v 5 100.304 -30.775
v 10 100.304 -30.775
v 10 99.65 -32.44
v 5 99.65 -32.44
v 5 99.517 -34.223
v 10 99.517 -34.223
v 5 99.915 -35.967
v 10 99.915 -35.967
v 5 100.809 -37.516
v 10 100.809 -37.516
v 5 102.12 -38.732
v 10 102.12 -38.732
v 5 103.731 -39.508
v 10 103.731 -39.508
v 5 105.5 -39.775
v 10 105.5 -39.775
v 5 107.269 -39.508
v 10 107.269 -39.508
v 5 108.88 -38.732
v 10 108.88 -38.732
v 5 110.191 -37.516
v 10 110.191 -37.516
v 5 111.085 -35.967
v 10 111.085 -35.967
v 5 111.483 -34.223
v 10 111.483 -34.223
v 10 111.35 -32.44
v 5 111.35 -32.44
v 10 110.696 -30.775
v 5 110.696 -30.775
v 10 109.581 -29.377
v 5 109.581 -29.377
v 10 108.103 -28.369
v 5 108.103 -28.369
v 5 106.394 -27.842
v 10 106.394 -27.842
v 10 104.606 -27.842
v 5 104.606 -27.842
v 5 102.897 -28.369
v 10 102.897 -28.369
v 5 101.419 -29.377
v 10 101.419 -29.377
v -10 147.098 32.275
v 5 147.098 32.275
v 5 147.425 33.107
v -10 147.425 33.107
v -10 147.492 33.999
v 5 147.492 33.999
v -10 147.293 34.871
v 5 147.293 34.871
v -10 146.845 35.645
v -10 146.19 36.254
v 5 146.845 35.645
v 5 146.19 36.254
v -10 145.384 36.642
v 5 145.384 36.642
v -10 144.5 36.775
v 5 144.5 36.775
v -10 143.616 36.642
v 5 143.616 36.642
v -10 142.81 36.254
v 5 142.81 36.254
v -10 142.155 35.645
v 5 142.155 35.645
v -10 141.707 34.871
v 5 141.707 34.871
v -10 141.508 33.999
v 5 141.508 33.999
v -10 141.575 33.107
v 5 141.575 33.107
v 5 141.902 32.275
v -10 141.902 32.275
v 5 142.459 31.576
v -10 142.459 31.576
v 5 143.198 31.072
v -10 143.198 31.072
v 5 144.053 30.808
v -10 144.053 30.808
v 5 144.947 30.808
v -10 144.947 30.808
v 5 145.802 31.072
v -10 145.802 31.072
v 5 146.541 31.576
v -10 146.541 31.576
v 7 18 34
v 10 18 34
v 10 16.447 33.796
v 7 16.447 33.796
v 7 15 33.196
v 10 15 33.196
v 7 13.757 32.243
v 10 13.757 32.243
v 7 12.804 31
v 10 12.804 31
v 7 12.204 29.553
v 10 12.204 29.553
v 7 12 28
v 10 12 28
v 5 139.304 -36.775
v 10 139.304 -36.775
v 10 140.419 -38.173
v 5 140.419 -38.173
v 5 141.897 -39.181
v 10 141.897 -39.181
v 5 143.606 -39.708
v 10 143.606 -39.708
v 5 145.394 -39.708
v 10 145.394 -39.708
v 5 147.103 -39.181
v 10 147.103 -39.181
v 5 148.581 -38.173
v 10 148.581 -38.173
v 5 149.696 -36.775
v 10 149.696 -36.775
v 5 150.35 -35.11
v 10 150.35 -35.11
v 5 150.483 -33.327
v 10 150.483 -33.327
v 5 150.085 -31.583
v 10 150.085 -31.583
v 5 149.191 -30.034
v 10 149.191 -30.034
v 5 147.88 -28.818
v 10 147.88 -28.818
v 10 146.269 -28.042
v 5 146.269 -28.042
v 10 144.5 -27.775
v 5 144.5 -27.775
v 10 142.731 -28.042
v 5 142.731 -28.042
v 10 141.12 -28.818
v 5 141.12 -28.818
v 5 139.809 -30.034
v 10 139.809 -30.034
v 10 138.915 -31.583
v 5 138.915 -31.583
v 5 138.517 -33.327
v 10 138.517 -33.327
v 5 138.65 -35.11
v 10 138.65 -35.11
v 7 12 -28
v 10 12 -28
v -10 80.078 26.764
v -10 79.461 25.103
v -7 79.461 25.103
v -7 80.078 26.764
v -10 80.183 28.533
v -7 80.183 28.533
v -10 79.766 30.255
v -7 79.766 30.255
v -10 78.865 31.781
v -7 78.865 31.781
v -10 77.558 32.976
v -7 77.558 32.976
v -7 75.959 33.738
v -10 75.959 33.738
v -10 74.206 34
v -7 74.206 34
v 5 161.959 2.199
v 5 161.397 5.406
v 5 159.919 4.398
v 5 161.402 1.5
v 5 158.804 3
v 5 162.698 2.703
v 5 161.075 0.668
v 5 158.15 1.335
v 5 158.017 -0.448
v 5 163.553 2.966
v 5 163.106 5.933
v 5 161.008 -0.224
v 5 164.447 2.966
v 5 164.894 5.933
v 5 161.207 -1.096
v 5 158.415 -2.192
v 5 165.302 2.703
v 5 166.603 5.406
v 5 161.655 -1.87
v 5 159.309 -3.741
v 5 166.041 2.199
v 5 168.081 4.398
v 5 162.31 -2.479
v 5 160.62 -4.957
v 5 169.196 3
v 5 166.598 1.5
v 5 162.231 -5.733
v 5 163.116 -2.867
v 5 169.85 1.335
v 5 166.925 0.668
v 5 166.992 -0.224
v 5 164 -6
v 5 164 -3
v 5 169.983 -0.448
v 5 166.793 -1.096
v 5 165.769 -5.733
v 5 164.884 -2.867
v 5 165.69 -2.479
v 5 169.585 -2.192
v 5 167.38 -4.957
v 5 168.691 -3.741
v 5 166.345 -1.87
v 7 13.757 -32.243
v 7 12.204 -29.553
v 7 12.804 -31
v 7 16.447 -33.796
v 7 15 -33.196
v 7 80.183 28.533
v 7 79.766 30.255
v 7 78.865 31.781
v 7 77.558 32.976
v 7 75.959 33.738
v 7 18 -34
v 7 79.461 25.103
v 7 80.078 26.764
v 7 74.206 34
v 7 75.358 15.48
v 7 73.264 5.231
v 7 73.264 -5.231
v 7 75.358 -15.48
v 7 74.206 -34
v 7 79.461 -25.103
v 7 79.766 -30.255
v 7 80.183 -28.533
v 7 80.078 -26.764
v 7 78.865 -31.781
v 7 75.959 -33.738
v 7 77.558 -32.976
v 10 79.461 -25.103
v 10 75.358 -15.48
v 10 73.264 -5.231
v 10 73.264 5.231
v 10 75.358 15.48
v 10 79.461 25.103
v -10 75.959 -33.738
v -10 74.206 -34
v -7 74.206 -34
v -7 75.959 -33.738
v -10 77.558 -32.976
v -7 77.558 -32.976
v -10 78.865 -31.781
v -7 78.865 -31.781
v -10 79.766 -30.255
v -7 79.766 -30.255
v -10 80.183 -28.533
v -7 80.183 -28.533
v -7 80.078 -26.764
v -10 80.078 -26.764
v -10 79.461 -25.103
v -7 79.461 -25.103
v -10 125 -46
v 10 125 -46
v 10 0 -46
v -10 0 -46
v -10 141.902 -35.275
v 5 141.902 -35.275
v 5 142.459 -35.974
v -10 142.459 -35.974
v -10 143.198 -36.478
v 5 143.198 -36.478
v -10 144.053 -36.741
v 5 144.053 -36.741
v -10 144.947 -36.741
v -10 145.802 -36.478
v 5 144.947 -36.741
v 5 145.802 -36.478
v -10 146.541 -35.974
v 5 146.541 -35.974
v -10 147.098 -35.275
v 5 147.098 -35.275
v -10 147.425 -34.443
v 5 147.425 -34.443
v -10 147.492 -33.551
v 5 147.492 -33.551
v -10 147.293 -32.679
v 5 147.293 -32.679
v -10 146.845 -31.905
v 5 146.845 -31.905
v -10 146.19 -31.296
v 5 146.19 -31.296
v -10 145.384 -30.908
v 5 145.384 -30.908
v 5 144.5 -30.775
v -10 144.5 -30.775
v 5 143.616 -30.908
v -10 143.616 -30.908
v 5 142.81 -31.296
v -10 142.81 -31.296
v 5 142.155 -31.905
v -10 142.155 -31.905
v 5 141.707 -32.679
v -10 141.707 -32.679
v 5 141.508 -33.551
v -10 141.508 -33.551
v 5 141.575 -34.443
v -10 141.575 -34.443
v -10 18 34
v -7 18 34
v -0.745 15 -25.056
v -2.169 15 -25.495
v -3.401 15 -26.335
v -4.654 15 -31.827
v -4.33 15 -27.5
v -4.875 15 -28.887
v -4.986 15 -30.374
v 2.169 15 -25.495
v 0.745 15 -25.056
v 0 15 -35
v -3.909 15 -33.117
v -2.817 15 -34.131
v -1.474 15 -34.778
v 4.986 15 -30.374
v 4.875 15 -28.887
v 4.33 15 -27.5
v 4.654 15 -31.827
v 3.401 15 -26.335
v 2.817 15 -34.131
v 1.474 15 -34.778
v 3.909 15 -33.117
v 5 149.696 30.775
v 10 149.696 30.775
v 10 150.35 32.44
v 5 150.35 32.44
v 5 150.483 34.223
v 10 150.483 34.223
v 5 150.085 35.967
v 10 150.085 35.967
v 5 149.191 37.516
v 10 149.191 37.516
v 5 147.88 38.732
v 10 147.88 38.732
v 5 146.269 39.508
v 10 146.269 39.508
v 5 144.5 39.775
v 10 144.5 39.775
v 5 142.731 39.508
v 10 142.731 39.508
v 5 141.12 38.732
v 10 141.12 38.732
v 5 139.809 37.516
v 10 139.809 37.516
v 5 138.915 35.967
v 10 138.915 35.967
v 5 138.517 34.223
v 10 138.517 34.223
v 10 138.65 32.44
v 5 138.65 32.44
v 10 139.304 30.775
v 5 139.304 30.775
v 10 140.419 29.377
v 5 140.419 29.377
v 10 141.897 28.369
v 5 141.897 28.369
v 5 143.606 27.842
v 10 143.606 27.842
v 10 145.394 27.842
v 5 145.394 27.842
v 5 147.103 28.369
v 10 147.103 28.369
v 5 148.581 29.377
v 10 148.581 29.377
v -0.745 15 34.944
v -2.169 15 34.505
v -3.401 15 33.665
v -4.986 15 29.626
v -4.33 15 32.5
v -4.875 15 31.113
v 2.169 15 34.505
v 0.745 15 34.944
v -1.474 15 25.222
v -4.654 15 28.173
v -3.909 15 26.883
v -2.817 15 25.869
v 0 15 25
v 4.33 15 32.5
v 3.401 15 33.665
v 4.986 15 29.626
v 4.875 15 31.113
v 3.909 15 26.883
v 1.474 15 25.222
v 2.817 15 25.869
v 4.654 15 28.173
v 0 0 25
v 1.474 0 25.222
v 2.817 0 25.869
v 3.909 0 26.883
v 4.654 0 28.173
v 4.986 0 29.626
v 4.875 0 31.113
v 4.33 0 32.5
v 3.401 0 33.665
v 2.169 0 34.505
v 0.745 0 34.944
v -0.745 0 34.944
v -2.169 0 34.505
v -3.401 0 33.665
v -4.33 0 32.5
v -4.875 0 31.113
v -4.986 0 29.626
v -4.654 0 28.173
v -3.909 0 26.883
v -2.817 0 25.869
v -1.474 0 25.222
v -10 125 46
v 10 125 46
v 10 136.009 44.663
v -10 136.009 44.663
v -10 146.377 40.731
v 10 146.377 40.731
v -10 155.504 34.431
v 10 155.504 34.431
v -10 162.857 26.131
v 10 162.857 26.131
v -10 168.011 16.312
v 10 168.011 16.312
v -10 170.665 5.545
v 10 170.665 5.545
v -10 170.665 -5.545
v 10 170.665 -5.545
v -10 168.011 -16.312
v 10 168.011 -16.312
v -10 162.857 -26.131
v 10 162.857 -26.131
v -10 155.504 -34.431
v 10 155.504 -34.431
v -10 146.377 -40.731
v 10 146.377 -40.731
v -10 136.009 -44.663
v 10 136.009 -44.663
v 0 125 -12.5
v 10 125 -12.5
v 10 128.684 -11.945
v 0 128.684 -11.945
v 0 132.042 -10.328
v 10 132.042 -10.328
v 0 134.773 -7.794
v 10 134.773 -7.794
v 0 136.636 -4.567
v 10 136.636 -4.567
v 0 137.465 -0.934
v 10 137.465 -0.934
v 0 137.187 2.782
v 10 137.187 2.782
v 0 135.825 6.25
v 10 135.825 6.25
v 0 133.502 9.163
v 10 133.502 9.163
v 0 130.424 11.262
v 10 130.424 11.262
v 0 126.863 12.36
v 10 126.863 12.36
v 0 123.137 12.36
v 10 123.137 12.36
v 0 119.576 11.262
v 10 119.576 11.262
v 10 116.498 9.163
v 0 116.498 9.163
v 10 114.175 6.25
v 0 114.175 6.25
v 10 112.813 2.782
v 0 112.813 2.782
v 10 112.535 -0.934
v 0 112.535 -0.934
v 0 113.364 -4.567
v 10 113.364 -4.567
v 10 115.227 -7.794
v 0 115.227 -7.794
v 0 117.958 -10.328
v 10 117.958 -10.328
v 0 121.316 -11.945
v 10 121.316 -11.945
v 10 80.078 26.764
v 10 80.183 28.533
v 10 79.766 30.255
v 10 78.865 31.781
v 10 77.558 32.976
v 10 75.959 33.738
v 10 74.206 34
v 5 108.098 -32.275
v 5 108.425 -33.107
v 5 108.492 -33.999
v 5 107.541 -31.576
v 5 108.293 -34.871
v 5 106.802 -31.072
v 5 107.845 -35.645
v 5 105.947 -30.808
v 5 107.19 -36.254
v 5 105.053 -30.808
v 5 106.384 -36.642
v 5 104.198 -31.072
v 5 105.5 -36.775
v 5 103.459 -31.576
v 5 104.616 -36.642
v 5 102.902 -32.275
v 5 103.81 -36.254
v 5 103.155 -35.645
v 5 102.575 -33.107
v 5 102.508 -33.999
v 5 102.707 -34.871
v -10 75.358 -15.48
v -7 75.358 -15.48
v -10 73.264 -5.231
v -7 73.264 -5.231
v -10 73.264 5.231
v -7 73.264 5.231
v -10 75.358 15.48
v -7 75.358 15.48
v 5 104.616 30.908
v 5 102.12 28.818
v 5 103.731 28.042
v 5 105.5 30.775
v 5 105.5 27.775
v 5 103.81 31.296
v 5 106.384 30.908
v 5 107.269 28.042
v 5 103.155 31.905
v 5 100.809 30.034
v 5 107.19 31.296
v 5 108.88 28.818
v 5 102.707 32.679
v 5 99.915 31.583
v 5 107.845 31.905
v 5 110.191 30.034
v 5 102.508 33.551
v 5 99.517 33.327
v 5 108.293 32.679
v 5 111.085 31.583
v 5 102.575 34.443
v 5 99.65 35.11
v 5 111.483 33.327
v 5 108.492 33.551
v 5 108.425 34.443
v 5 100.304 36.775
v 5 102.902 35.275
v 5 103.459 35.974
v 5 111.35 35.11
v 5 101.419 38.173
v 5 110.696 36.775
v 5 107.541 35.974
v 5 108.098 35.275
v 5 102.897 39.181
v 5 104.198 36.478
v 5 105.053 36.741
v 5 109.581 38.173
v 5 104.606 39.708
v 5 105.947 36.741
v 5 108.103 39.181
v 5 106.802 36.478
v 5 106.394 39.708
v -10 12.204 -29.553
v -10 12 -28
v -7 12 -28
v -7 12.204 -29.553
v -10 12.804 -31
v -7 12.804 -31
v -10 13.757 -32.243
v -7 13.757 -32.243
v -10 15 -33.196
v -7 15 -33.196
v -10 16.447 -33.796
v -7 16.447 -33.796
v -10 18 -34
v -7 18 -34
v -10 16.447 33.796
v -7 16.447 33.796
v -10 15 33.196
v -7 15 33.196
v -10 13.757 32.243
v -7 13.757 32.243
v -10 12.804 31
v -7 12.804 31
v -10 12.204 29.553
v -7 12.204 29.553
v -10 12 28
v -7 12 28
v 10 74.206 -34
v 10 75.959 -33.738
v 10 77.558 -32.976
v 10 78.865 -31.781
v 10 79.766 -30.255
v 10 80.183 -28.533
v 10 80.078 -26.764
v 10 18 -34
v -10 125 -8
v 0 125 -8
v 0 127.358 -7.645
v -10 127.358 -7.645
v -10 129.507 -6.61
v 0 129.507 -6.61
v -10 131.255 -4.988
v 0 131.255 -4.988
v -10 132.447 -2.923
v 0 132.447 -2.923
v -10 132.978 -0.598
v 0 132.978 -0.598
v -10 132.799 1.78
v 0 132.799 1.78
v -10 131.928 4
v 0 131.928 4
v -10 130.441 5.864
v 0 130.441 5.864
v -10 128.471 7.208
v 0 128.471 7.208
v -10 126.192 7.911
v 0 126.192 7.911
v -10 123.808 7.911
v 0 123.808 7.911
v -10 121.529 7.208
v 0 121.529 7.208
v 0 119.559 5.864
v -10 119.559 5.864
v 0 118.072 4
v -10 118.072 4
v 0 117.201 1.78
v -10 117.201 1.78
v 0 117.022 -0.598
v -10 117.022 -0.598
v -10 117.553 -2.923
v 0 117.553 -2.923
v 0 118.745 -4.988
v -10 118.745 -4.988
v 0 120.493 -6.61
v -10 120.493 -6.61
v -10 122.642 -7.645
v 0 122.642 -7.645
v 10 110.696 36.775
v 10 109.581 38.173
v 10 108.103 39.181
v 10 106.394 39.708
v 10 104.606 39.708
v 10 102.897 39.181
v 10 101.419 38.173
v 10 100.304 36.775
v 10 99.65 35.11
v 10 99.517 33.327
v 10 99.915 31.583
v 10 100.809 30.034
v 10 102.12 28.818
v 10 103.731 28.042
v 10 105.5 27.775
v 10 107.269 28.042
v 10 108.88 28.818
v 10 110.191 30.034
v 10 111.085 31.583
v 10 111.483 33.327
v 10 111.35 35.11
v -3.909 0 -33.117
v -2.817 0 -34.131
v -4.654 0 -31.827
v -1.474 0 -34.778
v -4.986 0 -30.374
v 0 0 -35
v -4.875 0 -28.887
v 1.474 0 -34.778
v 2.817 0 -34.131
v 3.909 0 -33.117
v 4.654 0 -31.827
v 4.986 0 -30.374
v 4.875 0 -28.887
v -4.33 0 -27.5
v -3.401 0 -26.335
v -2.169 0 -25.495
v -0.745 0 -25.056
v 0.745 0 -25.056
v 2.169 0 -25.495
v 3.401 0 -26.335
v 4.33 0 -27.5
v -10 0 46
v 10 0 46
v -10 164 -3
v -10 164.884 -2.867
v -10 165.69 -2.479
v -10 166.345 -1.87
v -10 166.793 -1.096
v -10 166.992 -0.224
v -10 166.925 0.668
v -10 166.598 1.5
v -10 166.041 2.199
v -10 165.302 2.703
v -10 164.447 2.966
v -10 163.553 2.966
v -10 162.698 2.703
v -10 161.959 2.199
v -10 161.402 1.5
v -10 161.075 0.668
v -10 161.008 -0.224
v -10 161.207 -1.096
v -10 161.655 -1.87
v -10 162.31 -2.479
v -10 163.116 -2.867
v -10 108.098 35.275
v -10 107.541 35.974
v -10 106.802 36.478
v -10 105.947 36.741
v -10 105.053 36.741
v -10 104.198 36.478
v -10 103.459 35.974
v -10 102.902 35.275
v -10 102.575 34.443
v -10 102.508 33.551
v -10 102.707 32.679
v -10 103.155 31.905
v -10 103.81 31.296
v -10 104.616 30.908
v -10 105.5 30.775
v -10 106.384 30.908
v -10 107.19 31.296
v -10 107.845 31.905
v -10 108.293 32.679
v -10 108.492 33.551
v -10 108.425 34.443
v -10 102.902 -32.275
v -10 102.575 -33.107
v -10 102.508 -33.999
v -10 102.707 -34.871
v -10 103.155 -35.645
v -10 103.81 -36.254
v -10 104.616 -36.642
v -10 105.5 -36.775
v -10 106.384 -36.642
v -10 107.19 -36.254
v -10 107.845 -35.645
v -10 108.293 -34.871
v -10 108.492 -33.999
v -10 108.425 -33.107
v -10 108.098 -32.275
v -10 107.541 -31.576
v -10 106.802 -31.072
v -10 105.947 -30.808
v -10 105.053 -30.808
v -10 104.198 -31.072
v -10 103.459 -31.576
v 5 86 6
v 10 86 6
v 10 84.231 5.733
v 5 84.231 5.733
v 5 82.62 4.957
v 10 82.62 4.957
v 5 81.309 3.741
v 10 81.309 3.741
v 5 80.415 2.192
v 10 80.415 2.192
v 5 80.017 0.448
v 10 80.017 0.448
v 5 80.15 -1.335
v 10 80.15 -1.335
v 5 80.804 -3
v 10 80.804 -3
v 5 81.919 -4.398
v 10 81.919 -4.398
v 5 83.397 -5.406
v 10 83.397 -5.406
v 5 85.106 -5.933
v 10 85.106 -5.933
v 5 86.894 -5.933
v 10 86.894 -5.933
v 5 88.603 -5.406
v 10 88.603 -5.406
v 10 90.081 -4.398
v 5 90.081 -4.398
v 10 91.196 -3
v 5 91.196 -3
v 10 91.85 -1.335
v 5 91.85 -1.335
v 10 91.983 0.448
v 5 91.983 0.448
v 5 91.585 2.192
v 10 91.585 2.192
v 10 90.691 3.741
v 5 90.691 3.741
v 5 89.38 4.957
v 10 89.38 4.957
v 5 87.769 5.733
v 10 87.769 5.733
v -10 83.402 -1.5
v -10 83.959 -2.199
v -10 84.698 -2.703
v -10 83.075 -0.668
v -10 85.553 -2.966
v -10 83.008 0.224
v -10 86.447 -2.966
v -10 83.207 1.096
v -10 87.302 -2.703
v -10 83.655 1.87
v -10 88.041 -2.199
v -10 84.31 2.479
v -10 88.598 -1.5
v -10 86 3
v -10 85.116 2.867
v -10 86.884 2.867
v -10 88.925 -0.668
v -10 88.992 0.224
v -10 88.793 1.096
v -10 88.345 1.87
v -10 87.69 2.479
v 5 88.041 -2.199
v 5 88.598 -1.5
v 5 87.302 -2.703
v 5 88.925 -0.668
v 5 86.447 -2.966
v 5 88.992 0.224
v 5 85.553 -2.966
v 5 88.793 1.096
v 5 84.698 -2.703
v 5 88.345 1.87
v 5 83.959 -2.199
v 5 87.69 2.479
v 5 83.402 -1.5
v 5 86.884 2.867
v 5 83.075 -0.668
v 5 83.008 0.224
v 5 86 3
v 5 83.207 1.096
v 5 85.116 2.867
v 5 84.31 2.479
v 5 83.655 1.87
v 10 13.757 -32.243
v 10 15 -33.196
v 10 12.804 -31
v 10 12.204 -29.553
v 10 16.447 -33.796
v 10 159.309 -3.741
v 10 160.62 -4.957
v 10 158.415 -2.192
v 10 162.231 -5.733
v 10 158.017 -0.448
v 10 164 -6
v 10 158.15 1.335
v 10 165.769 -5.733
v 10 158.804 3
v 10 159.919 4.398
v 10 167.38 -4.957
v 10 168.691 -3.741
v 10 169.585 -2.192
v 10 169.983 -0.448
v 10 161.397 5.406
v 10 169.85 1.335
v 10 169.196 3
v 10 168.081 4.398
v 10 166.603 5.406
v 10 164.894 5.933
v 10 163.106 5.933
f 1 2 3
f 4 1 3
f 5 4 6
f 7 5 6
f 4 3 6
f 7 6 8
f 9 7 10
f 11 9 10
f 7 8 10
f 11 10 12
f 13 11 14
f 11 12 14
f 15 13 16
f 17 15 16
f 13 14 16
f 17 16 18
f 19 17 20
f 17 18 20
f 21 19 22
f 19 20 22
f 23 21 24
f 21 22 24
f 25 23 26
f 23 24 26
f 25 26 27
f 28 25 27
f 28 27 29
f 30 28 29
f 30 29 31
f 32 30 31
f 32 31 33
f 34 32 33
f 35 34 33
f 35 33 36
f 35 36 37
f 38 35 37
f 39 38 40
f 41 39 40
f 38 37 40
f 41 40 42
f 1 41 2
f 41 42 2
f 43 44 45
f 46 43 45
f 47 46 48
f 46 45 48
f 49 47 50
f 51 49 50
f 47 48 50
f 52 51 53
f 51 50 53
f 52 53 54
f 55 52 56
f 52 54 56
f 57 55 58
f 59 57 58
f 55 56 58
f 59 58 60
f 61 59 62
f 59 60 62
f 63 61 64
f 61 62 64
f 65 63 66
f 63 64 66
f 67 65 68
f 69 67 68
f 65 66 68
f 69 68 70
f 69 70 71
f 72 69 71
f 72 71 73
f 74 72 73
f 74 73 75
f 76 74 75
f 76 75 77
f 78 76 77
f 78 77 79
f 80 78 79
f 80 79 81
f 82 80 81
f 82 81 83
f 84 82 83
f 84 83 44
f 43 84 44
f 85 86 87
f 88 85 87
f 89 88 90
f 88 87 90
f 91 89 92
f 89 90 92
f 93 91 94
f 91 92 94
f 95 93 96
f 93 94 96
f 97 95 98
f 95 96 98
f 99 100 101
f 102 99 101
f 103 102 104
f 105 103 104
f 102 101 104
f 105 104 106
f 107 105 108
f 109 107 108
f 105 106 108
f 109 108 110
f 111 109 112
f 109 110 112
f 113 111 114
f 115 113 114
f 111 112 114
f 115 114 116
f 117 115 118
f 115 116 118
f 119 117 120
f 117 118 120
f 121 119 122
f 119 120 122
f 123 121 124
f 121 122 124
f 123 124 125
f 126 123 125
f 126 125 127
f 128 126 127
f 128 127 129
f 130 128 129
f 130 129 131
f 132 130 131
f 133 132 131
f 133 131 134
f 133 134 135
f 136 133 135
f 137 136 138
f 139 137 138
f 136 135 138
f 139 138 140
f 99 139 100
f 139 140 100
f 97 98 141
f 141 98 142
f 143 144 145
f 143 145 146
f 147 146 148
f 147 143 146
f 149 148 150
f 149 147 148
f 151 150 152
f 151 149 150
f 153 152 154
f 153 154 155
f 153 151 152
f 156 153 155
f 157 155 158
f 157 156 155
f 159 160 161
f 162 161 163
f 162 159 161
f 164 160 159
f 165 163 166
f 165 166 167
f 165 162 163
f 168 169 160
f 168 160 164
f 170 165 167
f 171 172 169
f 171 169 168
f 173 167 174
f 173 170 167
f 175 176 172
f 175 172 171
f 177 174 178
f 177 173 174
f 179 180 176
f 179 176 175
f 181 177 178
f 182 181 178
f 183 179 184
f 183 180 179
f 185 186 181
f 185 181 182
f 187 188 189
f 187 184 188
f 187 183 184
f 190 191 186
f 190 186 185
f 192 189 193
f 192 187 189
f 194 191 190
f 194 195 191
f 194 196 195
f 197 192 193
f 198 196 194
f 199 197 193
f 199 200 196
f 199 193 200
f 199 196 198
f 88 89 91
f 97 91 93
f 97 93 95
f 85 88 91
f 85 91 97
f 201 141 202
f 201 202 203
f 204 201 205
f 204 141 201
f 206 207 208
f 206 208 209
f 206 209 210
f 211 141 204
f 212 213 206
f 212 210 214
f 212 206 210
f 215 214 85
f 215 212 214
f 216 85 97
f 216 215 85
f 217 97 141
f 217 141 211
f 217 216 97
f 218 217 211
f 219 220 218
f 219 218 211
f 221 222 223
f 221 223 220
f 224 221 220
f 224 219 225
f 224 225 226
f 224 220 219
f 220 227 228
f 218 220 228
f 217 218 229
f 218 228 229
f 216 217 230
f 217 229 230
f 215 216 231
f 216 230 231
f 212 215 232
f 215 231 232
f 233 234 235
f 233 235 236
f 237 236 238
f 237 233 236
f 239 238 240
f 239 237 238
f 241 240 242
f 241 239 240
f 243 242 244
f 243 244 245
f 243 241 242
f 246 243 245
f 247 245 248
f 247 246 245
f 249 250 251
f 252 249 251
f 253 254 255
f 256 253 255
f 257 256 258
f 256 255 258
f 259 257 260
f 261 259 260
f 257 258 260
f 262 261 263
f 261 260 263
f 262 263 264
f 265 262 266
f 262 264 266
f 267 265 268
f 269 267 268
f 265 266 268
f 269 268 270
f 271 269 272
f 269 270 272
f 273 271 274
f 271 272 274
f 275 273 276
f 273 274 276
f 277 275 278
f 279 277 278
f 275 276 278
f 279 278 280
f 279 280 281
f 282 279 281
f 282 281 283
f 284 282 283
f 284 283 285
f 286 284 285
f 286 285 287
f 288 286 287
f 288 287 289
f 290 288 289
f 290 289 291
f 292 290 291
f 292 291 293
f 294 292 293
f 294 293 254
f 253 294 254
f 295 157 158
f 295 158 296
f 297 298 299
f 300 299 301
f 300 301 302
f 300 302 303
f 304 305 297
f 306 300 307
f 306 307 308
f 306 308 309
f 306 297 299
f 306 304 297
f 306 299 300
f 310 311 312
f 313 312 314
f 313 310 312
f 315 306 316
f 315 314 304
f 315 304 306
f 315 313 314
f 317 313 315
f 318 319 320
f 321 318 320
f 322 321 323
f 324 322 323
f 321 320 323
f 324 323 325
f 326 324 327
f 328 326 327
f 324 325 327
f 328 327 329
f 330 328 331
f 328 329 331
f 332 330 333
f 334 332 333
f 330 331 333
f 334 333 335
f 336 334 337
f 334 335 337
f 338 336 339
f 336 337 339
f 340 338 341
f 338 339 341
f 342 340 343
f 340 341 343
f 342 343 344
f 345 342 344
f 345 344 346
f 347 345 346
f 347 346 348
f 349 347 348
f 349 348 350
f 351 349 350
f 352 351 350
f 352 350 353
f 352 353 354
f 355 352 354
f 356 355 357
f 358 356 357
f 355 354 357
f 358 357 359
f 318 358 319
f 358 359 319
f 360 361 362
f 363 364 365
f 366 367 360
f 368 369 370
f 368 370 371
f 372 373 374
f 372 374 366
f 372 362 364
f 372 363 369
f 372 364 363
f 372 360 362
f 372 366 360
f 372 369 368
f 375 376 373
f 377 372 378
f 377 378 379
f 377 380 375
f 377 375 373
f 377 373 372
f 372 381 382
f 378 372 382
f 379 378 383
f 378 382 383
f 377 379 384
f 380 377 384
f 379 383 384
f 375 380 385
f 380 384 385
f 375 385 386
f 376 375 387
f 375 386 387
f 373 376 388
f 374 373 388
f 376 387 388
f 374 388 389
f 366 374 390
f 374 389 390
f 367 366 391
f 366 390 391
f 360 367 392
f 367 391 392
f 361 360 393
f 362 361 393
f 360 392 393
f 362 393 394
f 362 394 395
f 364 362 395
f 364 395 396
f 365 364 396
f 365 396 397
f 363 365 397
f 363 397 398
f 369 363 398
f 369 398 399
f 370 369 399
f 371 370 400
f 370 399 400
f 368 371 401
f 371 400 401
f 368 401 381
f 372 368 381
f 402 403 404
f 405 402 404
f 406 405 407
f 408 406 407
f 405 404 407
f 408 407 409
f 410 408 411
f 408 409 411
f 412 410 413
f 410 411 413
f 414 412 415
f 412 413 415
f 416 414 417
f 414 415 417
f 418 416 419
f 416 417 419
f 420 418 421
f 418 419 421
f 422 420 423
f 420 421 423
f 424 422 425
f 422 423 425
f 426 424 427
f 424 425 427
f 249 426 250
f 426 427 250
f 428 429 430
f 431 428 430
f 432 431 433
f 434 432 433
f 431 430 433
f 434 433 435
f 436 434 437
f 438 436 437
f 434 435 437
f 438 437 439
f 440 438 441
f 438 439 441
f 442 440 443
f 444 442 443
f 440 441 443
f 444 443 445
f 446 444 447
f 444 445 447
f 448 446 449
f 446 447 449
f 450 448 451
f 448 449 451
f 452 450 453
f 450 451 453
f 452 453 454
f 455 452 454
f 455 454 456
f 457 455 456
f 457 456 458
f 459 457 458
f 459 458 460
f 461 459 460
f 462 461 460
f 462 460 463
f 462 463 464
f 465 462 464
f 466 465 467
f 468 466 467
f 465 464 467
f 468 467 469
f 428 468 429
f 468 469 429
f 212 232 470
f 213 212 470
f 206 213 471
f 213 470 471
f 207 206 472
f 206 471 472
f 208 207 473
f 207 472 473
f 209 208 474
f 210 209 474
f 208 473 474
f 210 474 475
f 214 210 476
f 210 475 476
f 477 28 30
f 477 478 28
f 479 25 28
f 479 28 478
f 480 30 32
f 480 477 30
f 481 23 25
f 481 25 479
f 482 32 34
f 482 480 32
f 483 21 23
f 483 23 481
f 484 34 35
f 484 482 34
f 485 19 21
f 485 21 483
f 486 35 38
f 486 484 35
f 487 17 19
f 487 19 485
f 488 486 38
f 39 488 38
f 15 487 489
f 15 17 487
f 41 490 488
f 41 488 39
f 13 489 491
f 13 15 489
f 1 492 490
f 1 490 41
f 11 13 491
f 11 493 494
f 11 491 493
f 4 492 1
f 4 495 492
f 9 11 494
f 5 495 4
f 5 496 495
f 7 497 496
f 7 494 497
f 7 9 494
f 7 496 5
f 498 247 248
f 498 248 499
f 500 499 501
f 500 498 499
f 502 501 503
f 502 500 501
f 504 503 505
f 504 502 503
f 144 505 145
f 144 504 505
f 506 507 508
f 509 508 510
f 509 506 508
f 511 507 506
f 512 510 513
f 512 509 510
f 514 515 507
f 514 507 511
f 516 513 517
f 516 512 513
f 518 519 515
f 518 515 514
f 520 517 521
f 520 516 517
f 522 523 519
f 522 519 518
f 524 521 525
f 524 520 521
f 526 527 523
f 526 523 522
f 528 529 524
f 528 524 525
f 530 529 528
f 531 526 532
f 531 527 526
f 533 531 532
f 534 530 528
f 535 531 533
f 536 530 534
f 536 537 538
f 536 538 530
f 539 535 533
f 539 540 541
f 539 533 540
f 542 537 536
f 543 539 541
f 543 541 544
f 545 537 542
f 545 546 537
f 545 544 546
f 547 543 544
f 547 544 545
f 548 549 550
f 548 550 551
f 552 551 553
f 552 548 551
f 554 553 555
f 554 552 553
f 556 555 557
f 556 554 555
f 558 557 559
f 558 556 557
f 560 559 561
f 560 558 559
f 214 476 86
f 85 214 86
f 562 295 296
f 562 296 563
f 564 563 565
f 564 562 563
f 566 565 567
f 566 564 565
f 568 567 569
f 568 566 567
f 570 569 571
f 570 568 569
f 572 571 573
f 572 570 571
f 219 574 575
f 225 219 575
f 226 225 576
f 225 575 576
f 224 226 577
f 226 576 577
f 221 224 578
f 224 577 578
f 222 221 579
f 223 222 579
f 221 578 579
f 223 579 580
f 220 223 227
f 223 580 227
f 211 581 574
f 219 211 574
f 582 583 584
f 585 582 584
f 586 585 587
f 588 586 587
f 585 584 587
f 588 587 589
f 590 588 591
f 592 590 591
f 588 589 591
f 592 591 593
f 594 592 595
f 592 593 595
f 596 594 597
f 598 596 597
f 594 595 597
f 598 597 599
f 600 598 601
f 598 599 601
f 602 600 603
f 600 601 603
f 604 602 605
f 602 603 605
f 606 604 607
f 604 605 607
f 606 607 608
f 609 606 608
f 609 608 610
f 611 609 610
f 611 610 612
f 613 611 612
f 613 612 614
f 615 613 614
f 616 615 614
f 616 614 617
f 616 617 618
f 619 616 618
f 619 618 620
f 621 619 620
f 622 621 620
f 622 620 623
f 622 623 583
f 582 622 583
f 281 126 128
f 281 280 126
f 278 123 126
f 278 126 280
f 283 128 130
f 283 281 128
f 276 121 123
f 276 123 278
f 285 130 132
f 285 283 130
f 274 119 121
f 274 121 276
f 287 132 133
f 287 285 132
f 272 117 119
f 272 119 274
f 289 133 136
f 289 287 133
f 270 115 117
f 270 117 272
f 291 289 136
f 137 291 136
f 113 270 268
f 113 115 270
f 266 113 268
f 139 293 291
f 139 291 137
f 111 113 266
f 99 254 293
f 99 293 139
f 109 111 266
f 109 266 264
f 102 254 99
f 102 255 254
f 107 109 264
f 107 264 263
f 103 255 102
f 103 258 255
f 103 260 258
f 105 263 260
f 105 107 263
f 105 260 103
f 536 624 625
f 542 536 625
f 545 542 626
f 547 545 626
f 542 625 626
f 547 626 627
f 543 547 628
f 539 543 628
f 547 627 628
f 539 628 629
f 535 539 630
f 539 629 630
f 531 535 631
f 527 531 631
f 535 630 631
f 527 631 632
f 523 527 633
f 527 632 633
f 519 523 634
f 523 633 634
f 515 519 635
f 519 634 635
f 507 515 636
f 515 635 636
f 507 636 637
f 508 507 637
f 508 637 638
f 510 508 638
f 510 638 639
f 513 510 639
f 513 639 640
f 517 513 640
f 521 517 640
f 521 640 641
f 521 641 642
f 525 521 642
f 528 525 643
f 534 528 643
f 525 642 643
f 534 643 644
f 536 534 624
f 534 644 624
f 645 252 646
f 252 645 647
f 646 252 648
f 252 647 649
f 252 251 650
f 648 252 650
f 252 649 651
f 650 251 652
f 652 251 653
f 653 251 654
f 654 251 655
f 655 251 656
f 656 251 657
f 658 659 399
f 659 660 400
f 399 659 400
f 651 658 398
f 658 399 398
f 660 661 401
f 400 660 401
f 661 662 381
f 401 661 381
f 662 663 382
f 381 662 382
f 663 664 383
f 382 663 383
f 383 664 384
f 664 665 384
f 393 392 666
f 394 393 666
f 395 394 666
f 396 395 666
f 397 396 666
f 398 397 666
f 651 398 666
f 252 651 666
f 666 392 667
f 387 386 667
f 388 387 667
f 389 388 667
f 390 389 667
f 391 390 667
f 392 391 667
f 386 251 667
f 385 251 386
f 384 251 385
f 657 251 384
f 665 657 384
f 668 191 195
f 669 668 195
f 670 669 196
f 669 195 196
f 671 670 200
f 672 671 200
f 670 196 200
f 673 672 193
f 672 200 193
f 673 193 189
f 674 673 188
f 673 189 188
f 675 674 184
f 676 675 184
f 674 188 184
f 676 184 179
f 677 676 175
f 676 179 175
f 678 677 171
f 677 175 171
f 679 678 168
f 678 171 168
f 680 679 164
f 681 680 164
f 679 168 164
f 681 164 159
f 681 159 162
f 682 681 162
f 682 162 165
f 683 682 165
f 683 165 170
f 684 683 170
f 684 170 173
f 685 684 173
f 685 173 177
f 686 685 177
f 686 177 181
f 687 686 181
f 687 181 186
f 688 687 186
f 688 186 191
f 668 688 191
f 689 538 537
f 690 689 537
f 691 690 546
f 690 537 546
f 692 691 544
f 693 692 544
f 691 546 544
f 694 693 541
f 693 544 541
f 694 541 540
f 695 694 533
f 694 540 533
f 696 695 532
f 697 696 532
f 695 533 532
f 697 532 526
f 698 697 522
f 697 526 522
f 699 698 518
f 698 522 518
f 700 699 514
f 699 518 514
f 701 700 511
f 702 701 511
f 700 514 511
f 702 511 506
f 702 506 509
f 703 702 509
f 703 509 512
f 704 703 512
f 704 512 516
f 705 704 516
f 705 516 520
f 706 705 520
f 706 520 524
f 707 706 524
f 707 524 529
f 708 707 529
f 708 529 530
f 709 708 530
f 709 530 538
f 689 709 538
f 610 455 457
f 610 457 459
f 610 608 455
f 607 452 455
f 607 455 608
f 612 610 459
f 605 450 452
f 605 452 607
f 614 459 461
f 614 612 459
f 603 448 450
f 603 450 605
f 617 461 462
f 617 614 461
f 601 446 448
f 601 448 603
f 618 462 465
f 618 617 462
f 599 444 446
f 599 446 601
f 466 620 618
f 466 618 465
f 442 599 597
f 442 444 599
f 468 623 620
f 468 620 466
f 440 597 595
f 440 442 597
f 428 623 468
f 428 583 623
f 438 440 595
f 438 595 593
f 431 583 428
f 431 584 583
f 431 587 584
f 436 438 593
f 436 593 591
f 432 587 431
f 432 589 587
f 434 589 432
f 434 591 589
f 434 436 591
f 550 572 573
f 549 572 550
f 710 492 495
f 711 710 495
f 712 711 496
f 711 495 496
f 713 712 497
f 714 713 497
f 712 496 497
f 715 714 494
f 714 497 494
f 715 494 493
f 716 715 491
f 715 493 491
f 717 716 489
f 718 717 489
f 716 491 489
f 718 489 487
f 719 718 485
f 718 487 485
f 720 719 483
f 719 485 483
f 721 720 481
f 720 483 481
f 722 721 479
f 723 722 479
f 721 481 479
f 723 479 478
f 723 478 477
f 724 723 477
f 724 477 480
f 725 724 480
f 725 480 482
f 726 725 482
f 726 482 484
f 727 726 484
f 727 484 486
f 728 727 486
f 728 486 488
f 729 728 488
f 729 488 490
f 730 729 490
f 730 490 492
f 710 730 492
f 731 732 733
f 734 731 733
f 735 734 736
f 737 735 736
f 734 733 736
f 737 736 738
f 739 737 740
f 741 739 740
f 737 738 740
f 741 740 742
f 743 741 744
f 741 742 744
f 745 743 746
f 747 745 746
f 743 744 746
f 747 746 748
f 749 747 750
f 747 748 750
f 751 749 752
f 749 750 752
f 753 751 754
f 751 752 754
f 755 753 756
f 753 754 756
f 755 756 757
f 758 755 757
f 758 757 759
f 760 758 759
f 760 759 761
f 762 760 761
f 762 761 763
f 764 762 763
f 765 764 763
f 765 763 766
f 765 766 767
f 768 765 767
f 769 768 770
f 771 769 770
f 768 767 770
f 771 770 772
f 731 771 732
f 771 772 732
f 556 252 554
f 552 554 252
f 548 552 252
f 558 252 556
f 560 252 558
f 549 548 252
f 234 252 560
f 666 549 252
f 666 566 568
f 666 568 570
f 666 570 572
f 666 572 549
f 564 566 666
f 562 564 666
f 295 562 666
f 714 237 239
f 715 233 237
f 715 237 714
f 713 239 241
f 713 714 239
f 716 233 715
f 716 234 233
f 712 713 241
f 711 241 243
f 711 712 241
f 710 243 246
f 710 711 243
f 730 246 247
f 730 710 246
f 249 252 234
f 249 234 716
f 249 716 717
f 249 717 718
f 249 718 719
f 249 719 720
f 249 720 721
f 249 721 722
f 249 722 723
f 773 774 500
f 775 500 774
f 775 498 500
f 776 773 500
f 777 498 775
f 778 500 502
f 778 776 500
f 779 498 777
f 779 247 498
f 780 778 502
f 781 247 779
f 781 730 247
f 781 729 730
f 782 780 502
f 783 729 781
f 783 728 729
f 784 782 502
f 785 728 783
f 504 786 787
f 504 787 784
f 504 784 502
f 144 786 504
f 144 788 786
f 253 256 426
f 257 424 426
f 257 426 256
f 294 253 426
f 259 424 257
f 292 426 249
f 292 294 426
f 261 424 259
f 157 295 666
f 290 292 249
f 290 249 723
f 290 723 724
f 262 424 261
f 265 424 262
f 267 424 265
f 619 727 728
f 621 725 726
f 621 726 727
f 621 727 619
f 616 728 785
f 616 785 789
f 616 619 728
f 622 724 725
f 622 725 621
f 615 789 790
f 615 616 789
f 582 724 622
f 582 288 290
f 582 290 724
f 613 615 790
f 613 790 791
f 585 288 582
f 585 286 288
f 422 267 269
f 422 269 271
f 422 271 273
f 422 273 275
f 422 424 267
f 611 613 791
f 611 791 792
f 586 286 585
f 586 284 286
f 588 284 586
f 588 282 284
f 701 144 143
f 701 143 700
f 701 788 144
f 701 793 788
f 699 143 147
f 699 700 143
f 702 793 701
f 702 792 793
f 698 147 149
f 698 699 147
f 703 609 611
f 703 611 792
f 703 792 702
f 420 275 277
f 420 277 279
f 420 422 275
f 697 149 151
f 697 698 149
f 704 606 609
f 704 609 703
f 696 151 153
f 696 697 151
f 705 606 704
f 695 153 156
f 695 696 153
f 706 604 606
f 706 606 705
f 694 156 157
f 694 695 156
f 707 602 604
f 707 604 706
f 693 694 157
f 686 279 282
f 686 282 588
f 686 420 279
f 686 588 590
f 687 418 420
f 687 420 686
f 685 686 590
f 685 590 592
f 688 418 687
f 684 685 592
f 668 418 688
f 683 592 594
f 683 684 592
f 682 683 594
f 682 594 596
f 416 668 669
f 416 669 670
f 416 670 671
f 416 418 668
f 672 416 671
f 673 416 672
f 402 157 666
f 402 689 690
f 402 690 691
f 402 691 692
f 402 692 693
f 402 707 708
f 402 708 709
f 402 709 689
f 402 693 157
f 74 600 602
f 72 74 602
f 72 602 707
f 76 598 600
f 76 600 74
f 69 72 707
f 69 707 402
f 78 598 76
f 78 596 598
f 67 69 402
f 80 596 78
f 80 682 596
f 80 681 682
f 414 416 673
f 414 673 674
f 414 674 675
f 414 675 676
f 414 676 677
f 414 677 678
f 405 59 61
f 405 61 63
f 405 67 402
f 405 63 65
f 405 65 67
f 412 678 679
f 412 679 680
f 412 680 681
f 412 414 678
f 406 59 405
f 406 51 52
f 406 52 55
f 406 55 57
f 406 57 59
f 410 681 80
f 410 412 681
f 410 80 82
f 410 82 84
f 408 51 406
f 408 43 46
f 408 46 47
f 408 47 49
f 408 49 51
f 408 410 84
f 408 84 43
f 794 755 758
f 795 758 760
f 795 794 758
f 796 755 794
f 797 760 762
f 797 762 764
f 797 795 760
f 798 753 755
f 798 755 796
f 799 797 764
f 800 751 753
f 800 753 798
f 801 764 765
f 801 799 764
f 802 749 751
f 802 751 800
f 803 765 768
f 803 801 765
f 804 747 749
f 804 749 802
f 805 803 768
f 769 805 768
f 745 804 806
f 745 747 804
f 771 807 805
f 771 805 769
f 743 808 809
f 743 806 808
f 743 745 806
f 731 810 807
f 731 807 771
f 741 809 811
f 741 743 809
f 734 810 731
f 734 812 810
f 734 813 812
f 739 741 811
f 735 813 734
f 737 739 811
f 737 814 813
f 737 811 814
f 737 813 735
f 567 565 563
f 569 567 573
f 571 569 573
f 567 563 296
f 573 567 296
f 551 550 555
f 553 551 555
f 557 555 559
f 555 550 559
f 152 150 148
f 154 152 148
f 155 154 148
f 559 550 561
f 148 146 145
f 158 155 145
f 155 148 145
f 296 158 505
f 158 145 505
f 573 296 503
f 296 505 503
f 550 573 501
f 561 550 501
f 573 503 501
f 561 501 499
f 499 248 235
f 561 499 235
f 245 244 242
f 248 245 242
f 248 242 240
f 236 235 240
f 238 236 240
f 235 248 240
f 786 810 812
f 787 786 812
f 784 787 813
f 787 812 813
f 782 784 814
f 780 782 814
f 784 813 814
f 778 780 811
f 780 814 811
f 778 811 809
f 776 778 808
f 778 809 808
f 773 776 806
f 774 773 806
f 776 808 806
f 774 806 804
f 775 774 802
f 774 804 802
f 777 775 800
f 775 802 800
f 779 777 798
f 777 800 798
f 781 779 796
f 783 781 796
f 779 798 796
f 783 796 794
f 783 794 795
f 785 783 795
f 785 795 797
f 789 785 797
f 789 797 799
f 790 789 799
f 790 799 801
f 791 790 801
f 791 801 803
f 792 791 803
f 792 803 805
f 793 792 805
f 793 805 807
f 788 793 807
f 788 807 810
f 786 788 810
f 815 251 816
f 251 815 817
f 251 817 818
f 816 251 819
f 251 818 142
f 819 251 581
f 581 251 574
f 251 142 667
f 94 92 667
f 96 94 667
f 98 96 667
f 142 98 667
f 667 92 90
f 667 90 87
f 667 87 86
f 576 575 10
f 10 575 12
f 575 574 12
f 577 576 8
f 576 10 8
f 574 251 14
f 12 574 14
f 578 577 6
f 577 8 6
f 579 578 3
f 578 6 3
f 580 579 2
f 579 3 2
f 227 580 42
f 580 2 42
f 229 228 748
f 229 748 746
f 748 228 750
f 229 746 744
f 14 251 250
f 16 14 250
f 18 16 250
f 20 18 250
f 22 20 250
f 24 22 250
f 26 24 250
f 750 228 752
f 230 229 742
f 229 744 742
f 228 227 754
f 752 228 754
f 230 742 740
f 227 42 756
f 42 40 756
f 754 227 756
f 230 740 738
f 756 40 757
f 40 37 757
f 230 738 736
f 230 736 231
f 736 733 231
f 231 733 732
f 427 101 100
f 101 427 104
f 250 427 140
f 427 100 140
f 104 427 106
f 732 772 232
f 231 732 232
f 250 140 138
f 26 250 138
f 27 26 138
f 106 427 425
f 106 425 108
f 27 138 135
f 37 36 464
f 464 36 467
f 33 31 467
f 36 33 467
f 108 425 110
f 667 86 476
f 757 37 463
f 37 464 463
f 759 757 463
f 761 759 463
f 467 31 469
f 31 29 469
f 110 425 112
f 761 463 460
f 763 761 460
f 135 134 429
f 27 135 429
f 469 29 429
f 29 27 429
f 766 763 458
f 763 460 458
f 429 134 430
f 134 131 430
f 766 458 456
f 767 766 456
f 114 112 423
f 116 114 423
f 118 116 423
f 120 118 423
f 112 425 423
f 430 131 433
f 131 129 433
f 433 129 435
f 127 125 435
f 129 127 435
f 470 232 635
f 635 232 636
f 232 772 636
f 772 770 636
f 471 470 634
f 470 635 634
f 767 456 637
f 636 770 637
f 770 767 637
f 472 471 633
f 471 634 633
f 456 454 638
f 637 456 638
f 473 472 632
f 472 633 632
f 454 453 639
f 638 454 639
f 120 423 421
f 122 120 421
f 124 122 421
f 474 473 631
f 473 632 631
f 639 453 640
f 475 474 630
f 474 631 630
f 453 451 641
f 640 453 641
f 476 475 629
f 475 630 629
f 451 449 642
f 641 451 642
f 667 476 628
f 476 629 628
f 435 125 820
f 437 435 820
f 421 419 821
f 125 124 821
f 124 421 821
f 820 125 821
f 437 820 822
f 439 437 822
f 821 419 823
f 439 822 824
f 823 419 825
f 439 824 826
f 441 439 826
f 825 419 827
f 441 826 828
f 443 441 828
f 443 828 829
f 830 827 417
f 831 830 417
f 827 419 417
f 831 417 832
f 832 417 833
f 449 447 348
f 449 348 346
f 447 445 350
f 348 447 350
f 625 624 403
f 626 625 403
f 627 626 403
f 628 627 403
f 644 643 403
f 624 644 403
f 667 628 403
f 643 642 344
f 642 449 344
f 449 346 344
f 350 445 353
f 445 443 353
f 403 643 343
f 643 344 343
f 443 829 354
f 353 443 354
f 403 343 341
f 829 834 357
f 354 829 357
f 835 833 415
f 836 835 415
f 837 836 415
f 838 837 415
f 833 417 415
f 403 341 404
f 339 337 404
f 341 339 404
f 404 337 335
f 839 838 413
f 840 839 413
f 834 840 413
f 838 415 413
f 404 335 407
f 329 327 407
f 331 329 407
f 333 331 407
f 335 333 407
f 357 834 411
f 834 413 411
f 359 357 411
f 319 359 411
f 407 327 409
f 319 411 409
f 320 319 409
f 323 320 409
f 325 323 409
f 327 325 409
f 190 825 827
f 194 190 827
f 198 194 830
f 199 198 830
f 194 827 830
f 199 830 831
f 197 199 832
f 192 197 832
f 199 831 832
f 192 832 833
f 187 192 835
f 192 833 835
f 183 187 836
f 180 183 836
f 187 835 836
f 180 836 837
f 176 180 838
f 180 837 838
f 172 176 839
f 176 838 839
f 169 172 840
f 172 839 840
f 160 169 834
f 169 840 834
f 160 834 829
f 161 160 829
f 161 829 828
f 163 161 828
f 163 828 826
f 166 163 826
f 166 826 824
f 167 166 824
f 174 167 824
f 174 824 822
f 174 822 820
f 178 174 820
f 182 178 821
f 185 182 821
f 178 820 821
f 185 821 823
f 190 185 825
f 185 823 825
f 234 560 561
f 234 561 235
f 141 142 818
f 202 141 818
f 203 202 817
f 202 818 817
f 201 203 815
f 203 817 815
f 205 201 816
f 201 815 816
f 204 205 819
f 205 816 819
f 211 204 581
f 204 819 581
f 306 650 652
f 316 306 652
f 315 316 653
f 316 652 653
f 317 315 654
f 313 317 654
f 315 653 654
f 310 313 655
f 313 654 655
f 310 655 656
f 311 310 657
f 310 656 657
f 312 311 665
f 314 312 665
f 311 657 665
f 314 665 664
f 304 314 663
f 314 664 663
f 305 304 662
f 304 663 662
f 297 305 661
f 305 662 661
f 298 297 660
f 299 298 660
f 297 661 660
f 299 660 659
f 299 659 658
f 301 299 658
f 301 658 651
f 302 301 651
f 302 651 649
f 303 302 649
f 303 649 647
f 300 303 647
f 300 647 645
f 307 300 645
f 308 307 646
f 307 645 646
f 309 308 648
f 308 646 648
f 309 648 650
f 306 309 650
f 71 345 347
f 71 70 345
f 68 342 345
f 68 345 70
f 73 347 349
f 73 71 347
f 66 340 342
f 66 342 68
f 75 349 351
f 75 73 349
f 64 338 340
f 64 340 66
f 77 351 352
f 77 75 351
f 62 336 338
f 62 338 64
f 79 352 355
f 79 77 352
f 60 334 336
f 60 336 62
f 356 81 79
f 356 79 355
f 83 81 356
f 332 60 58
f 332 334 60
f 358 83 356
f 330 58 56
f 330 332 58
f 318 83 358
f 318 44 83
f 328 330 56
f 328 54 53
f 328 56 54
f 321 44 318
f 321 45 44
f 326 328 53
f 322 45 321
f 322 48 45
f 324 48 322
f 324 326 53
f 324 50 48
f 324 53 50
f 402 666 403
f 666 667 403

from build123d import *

# Parameters (mm, degrees)
BOSS_EXTRUDE1_DEPTH = 10
CUT_EXTRUDE1_DEPTH  = 3
SKETCH3_R           = 6
CUT_EXTRUDE2_DEPTH  = 5
SKETCH3_3_R         = 3
CUT_EXTRUDE3_DEPTH  = 179.204938203
CIRPATTERN1_COUNT   = 6
SKETCH4_R           = 12.5
CUT_EXTRUDE4_DEPTH  = 10
SKETCH4_3_R         = 8
CUT_EXTRUDE5_DEPTH  = 179.204938203
SKETCH5_R           = 5
CUT_EXTRUDE6_DEPTH  = 15


with BuildPart() as part:
    # Sketch1 → Boss-Extrude1 (new, symmetric)
    with BuildSketch(Plane(origin=(0, 0, 0), x_dir=(0, 0, -1), z_dir=(1, 0, 0))):
        with BuildLine():
            Line((46, 125), (46, 0))
            Line((46, 0), (-46, 0))
            Line((-46, 0), (-46, 125))
            ThreePointArc((-46, 125), (0, 171), (46, 125))
        make_face()
    extrude(amount=BOSS_EXTRUDE1_DEPTH, both=True)

    # Sketch2 → Cut-Extrude1 (cut)
    with BuildSketch(Plane(origin=(10, 0, 0), x_dir=(0, 0, -1), z_dir=(1, 0, 0))):
        with BuildLine():
            Line((-34, 74.206299603), (-34, 18))
            ThreePointArc((-34, 18), (-32.242640687, 13.757359313), (-28, 12))
            Line((-28, 12), (28, 12))
            ThreePointArc((28, 12), (32.242640687, 13.757359313), (34, 18))
            Line((34, 18), (34, 74.206299603))
            ThreePointArc((34, 74.206299603), (31.051285766, 79.372502771), (25.103448276, 79.460820334))
            ThreePointArc((25.103448276, 79.460820334), (0, 73), (-25.103448276, 79.460820334))
            ThreePointArc((-25.103448276, 79.460820334), (-31.051285766, 79.372502771), (-34, 74.206299603))
        make_face()
    cut_extrude1 = extrude(amount=-CUT_EXTRUDE1_DEPTH, mode=Mode.SUBTRACT)

    # Mirror1: Cut-Extrude1 across plane
    add(cut_extrude1.mirror(Plane(origin=(0, 0, 0), x_dir=(0, 0, 1), z_dir=(1, 0, 0))), mode=Mode.SUBTRACT)

    # Sketch3 → Cut-Extrude2 (cut)
    with BuildSketch(Plane(origin=(10, 0, 0), x_dir=(0, 0, -1), z_dir=(1, 0, 0))):
        with Locations((0, 164)):
            Circle(SKETCH3_R)
    cut_extrude2 = extrude(amount=-CUT_EXTRUDE2_DEPTH, mode=Mode.SUBTRACT)

    # Sketch3<3> → Cut-Extrude3 (cut, through all)
    with BuildSketch(Plane(origin=(10, 0, 0), x_dir=(0, 0, -1), z_dir=(1, 0, 0))):
        with Locations((0, 164)):
            Circle(SKETCH3_3_R)
    cut_extrude3 = extrude(amount=-CUT_EXTRUDE3_DEPTH, mode=Mode.SUBTRACT)

    # CirPattern1: Cut-Extrude2, Cut-Extrude3 ×6 about axis
    cirpattern1_axis = Axis((10, 125, 0), (1, 0, 0))
    add([cut_extrude2.rotate(cirpattern1_axis, i * 360 / CIRPATTERN1_COUNT) for i in range(1, CIRPATTERN1_COUNT)], mode=Mode.SUBTRACT)
    add([cut_extrude3.rotate(cirpattern1_axis, i * 360 / CIRPATTERN1_COUNT) for i in range(1, CIRPATTERN1_COUNT)], mode=Mode.SUBTRACT)

    # Sketch4 → Cut-Extrude4 (cut)
    with BuildSketch(Plane(origin=(10, 0, 0), x_dir=(0, 0, -1), z_dir=(1, 0, 0))):
        with Locations((0, 125)):
            Circle(SKETCH4_R)
    extrude(amount=-CUT_EXTRUDE4_DEPTH, mode=Mode.SUBTRACT)

    # Sketch4<3> → Cut-Extrude5 (cut, through all)
    with BuildSketch(Plane(origin=(10, 0, 0), x_dir=(0, 0, -1), z_dir=(1, 0, 0))):
        with Locations((0, 125)):
            Circle(SKETCH4_3_R)
    extrude(amount=-CUT_EXTRUDE5_DEPTH, mode=Mode.SUBTRACT)

    # Sketch5 → Cut-Extrude6 (cut)
    with BuildSketch(Plane.XZ):
        with Locations((0, 30)):
            Circle(SKETCH5_R)
        with Locations((0, -30)):
            Circle(SKETCH5_R)
    extrude(amount=-CUT_EXTRUDE6_DEPTH, mode=Mode.SUBTRACT)


solid = part.part
